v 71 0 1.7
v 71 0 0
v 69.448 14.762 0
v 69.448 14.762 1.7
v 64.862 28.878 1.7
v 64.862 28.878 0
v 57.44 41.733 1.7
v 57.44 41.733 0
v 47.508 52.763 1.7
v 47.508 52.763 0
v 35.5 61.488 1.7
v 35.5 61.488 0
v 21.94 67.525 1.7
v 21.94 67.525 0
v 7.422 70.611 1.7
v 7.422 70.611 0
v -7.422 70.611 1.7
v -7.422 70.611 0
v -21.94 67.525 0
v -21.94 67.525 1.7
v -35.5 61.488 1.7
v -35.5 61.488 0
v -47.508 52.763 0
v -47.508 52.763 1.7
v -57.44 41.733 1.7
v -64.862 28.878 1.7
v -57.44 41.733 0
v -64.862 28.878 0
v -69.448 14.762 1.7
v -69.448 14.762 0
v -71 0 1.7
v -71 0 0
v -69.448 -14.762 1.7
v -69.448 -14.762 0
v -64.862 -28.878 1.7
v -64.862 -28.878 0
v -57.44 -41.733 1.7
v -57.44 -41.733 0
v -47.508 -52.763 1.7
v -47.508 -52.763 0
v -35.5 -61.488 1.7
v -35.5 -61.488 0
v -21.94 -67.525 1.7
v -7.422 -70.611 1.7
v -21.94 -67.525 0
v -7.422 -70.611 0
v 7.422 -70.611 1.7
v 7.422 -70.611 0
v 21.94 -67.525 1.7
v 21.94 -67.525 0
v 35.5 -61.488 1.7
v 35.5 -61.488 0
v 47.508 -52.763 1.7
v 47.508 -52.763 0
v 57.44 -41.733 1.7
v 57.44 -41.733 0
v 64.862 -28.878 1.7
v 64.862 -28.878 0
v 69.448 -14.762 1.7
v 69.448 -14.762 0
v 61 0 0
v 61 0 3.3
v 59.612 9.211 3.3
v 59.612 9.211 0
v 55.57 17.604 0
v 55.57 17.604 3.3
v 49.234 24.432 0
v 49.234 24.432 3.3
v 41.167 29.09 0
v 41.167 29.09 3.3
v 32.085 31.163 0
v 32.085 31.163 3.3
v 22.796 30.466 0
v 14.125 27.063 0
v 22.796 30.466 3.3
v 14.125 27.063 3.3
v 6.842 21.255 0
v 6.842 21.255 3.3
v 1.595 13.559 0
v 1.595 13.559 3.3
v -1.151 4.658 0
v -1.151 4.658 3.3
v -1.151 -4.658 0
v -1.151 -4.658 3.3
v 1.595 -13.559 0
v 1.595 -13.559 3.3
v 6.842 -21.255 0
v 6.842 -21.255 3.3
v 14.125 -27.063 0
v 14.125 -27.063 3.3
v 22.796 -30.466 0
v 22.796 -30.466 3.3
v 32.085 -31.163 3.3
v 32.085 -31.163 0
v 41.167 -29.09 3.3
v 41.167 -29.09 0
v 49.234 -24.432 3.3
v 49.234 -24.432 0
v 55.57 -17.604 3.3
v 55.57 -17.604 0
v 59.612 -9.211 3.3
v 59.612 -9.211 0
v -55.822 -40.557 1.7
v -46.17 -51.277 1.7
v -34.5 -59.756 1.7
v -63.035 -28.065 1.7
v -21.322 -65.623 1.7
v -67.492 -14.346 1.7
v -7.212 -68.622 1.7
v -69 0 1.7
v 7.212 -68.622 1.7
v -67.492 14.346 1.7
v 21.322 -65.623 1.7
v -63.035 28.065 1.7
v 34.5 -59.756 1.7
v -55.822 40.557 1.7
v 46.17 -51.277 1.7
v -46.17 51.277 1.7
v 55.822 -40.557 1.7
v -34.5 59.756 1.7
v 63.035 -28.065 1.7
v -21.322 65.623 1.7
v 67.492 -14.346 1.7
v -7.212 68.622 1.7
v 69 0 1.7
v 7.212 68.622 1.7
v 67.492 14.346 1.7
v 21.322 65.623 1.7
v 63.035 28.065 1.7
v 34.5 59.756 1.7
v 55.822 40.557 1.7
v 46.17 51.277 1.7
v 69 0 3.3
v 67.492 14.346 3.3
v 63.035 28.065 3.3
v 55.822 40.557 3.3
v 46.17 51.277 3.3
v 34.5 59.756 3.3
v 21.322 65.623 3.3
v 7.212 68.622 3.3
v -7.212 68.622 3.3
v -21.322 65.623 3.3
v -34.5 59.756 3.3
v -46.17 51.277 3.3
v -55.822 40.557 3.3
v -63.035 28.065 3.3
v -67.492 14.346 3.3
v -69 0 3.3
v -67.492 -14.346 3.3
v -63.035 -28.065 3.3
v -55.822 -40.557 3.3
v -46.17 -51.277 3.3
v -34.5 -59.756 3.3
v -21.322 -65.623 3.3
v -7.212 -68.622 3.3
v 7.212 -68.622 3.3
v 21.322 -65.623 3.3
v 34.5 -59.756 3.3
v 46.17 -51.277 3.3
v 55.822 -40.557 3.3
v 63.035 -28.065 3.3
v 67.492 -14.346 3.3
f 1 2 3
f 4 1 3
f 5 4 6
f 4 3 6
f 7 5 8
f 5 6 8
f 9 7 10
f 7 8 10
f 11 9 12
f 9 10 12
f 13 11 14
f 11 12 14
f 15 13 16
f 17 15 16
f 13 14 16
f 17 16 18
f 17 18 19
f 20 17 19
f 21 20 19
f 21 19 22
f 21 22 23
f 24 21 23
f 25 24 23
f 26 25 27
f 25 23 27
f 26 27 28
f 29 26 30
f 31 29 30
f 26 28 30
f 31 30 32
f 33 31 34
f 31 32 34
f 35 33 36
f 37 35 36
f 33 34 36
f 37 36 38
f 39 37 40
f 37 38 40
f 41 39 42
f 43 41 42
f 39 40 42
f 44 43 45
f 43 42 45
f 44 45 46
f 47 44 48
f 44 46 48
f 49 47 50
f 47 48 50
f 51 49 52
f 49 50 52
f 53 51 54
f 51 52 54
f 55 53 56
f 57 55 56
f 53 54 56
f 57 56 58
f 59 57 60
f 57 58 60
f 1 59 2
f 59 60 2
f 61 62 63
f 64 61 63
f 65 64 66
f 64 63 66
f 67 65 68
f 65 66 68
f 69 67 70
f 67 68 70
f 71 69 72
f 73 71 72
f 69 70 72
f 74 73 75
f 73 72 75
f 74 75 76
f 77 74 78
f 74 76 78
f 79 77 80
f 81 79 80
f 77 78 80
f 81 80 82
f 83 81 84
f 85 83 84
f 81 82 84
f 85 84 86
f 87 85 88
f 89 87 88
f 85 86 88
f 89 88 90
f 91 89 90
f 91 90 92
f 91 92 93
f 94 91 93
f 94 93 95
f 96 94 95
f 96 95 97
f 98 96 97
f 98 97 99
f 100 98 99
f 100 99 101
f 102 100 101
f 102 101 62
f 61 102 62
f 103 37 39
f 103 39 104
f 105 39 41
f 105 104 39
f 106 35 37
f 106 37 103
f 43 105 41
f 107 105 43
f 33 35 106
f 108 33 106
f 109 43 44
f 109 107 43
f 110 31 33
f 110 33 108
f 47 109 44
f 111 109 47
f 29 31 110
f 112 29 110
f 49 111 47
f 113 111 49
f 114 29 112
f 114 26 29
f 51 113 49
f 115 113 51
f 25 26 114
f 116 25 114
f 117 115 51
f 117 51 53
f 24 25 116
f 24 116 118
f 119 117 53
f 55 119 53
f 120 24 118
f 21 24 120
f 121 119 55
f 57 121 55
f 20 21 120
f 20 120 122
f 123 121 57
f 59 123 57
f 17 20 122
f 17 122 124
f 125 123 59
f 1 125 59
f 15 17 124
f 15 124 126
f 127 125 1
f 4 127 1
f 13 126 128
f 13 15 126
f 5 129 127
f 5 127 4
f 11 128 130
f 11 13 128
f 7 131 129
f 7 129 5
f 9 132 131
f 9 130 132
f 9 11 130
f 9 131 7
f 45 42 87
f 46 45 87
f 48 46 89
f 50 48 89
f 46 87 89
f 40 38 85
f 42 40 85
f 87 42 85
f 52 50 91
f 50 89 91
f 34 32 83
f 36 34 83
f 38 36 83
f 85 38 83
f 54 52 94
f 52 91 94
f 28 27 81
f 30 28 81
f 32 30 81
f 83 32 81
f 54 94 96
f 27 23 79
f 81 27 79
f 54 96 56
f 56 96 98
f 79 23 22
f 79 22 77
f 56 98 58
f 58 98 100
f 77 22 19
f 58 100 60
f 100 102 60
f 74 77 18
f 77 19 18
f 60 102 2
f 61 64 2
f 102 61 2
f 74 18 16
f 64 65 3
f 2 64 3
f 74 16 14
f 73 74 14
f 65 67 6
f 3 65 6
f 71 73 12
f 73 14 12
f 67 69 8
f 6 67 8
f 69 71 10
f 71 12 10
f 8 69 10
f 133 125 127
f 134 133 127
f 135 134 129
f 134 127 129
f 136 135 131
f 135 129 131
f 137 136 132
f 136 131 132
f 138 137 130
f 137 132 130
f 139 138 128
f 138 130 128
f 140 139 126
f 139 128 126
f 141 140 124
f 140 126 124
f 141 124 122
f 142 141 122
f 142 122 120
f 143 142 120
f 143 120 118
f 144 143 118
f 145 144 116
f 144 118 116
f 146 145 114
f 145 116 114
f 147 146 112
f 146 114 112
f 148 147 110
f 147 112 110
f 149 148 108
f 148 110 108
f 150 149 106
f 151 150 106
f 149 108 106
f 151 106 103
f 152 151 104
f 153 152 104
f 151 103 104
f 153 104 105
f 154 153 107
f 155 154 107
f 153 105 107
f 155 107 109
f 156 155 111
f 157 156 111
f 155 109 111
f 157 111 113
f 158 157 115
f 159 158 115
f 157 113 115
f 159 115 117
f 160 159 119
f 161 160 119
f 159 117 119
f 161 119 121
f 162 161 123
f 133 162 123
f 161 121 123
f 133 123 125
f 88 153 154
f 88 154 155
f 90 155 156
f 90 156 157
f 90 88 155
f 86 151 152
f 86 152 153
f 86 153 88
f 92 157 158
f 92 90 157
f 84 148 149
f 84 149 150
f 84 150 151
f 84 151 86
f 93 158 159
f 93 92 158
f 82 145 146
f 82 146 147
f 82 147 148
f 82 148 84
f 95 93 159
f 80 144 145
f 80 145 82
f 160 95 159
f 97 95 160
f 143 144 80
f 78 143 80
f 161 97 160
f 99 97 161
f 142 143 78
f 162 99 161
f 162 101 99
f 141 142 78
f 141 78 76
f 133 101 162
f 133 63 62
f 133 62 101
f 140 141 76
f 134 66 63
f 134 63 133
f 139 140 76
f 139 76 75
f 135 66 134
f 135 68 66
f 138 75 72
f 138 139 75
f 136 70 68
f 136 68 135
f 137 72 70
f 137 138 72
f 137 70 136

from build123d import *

# Parameters (mm, degrees)
F0_R     = 71
F1_DEPTH = 1.7
F2_R     = 69
F3_DEPTH = 1.6
F4_R     = 31.25
F5_DEPTH = 25


with BuildPart() as f1:
    # F0 (on Top) → F1 (new body)
    with BuildSketch(Plane.XY):
        Circle(F0_R)
    extrude(amount=F1_DEPTH)

    # F2 (on face) → F3 (join)
    with BuildSketch(Plane.XY.offset(1.7)):
        Circle(F2_R)
    extrude(amount=F3_DEPTH)

    # F4 (on face) → F5 (cut)
    with BuildSketch(Plane.XY.offset(3.3)):
        with Locations((29.75, 0)):
            Circle(F4_R)
    extrude(amount=-F5_DEPTH, mode=Mode.SUBTRACT)


solid = f1.part
